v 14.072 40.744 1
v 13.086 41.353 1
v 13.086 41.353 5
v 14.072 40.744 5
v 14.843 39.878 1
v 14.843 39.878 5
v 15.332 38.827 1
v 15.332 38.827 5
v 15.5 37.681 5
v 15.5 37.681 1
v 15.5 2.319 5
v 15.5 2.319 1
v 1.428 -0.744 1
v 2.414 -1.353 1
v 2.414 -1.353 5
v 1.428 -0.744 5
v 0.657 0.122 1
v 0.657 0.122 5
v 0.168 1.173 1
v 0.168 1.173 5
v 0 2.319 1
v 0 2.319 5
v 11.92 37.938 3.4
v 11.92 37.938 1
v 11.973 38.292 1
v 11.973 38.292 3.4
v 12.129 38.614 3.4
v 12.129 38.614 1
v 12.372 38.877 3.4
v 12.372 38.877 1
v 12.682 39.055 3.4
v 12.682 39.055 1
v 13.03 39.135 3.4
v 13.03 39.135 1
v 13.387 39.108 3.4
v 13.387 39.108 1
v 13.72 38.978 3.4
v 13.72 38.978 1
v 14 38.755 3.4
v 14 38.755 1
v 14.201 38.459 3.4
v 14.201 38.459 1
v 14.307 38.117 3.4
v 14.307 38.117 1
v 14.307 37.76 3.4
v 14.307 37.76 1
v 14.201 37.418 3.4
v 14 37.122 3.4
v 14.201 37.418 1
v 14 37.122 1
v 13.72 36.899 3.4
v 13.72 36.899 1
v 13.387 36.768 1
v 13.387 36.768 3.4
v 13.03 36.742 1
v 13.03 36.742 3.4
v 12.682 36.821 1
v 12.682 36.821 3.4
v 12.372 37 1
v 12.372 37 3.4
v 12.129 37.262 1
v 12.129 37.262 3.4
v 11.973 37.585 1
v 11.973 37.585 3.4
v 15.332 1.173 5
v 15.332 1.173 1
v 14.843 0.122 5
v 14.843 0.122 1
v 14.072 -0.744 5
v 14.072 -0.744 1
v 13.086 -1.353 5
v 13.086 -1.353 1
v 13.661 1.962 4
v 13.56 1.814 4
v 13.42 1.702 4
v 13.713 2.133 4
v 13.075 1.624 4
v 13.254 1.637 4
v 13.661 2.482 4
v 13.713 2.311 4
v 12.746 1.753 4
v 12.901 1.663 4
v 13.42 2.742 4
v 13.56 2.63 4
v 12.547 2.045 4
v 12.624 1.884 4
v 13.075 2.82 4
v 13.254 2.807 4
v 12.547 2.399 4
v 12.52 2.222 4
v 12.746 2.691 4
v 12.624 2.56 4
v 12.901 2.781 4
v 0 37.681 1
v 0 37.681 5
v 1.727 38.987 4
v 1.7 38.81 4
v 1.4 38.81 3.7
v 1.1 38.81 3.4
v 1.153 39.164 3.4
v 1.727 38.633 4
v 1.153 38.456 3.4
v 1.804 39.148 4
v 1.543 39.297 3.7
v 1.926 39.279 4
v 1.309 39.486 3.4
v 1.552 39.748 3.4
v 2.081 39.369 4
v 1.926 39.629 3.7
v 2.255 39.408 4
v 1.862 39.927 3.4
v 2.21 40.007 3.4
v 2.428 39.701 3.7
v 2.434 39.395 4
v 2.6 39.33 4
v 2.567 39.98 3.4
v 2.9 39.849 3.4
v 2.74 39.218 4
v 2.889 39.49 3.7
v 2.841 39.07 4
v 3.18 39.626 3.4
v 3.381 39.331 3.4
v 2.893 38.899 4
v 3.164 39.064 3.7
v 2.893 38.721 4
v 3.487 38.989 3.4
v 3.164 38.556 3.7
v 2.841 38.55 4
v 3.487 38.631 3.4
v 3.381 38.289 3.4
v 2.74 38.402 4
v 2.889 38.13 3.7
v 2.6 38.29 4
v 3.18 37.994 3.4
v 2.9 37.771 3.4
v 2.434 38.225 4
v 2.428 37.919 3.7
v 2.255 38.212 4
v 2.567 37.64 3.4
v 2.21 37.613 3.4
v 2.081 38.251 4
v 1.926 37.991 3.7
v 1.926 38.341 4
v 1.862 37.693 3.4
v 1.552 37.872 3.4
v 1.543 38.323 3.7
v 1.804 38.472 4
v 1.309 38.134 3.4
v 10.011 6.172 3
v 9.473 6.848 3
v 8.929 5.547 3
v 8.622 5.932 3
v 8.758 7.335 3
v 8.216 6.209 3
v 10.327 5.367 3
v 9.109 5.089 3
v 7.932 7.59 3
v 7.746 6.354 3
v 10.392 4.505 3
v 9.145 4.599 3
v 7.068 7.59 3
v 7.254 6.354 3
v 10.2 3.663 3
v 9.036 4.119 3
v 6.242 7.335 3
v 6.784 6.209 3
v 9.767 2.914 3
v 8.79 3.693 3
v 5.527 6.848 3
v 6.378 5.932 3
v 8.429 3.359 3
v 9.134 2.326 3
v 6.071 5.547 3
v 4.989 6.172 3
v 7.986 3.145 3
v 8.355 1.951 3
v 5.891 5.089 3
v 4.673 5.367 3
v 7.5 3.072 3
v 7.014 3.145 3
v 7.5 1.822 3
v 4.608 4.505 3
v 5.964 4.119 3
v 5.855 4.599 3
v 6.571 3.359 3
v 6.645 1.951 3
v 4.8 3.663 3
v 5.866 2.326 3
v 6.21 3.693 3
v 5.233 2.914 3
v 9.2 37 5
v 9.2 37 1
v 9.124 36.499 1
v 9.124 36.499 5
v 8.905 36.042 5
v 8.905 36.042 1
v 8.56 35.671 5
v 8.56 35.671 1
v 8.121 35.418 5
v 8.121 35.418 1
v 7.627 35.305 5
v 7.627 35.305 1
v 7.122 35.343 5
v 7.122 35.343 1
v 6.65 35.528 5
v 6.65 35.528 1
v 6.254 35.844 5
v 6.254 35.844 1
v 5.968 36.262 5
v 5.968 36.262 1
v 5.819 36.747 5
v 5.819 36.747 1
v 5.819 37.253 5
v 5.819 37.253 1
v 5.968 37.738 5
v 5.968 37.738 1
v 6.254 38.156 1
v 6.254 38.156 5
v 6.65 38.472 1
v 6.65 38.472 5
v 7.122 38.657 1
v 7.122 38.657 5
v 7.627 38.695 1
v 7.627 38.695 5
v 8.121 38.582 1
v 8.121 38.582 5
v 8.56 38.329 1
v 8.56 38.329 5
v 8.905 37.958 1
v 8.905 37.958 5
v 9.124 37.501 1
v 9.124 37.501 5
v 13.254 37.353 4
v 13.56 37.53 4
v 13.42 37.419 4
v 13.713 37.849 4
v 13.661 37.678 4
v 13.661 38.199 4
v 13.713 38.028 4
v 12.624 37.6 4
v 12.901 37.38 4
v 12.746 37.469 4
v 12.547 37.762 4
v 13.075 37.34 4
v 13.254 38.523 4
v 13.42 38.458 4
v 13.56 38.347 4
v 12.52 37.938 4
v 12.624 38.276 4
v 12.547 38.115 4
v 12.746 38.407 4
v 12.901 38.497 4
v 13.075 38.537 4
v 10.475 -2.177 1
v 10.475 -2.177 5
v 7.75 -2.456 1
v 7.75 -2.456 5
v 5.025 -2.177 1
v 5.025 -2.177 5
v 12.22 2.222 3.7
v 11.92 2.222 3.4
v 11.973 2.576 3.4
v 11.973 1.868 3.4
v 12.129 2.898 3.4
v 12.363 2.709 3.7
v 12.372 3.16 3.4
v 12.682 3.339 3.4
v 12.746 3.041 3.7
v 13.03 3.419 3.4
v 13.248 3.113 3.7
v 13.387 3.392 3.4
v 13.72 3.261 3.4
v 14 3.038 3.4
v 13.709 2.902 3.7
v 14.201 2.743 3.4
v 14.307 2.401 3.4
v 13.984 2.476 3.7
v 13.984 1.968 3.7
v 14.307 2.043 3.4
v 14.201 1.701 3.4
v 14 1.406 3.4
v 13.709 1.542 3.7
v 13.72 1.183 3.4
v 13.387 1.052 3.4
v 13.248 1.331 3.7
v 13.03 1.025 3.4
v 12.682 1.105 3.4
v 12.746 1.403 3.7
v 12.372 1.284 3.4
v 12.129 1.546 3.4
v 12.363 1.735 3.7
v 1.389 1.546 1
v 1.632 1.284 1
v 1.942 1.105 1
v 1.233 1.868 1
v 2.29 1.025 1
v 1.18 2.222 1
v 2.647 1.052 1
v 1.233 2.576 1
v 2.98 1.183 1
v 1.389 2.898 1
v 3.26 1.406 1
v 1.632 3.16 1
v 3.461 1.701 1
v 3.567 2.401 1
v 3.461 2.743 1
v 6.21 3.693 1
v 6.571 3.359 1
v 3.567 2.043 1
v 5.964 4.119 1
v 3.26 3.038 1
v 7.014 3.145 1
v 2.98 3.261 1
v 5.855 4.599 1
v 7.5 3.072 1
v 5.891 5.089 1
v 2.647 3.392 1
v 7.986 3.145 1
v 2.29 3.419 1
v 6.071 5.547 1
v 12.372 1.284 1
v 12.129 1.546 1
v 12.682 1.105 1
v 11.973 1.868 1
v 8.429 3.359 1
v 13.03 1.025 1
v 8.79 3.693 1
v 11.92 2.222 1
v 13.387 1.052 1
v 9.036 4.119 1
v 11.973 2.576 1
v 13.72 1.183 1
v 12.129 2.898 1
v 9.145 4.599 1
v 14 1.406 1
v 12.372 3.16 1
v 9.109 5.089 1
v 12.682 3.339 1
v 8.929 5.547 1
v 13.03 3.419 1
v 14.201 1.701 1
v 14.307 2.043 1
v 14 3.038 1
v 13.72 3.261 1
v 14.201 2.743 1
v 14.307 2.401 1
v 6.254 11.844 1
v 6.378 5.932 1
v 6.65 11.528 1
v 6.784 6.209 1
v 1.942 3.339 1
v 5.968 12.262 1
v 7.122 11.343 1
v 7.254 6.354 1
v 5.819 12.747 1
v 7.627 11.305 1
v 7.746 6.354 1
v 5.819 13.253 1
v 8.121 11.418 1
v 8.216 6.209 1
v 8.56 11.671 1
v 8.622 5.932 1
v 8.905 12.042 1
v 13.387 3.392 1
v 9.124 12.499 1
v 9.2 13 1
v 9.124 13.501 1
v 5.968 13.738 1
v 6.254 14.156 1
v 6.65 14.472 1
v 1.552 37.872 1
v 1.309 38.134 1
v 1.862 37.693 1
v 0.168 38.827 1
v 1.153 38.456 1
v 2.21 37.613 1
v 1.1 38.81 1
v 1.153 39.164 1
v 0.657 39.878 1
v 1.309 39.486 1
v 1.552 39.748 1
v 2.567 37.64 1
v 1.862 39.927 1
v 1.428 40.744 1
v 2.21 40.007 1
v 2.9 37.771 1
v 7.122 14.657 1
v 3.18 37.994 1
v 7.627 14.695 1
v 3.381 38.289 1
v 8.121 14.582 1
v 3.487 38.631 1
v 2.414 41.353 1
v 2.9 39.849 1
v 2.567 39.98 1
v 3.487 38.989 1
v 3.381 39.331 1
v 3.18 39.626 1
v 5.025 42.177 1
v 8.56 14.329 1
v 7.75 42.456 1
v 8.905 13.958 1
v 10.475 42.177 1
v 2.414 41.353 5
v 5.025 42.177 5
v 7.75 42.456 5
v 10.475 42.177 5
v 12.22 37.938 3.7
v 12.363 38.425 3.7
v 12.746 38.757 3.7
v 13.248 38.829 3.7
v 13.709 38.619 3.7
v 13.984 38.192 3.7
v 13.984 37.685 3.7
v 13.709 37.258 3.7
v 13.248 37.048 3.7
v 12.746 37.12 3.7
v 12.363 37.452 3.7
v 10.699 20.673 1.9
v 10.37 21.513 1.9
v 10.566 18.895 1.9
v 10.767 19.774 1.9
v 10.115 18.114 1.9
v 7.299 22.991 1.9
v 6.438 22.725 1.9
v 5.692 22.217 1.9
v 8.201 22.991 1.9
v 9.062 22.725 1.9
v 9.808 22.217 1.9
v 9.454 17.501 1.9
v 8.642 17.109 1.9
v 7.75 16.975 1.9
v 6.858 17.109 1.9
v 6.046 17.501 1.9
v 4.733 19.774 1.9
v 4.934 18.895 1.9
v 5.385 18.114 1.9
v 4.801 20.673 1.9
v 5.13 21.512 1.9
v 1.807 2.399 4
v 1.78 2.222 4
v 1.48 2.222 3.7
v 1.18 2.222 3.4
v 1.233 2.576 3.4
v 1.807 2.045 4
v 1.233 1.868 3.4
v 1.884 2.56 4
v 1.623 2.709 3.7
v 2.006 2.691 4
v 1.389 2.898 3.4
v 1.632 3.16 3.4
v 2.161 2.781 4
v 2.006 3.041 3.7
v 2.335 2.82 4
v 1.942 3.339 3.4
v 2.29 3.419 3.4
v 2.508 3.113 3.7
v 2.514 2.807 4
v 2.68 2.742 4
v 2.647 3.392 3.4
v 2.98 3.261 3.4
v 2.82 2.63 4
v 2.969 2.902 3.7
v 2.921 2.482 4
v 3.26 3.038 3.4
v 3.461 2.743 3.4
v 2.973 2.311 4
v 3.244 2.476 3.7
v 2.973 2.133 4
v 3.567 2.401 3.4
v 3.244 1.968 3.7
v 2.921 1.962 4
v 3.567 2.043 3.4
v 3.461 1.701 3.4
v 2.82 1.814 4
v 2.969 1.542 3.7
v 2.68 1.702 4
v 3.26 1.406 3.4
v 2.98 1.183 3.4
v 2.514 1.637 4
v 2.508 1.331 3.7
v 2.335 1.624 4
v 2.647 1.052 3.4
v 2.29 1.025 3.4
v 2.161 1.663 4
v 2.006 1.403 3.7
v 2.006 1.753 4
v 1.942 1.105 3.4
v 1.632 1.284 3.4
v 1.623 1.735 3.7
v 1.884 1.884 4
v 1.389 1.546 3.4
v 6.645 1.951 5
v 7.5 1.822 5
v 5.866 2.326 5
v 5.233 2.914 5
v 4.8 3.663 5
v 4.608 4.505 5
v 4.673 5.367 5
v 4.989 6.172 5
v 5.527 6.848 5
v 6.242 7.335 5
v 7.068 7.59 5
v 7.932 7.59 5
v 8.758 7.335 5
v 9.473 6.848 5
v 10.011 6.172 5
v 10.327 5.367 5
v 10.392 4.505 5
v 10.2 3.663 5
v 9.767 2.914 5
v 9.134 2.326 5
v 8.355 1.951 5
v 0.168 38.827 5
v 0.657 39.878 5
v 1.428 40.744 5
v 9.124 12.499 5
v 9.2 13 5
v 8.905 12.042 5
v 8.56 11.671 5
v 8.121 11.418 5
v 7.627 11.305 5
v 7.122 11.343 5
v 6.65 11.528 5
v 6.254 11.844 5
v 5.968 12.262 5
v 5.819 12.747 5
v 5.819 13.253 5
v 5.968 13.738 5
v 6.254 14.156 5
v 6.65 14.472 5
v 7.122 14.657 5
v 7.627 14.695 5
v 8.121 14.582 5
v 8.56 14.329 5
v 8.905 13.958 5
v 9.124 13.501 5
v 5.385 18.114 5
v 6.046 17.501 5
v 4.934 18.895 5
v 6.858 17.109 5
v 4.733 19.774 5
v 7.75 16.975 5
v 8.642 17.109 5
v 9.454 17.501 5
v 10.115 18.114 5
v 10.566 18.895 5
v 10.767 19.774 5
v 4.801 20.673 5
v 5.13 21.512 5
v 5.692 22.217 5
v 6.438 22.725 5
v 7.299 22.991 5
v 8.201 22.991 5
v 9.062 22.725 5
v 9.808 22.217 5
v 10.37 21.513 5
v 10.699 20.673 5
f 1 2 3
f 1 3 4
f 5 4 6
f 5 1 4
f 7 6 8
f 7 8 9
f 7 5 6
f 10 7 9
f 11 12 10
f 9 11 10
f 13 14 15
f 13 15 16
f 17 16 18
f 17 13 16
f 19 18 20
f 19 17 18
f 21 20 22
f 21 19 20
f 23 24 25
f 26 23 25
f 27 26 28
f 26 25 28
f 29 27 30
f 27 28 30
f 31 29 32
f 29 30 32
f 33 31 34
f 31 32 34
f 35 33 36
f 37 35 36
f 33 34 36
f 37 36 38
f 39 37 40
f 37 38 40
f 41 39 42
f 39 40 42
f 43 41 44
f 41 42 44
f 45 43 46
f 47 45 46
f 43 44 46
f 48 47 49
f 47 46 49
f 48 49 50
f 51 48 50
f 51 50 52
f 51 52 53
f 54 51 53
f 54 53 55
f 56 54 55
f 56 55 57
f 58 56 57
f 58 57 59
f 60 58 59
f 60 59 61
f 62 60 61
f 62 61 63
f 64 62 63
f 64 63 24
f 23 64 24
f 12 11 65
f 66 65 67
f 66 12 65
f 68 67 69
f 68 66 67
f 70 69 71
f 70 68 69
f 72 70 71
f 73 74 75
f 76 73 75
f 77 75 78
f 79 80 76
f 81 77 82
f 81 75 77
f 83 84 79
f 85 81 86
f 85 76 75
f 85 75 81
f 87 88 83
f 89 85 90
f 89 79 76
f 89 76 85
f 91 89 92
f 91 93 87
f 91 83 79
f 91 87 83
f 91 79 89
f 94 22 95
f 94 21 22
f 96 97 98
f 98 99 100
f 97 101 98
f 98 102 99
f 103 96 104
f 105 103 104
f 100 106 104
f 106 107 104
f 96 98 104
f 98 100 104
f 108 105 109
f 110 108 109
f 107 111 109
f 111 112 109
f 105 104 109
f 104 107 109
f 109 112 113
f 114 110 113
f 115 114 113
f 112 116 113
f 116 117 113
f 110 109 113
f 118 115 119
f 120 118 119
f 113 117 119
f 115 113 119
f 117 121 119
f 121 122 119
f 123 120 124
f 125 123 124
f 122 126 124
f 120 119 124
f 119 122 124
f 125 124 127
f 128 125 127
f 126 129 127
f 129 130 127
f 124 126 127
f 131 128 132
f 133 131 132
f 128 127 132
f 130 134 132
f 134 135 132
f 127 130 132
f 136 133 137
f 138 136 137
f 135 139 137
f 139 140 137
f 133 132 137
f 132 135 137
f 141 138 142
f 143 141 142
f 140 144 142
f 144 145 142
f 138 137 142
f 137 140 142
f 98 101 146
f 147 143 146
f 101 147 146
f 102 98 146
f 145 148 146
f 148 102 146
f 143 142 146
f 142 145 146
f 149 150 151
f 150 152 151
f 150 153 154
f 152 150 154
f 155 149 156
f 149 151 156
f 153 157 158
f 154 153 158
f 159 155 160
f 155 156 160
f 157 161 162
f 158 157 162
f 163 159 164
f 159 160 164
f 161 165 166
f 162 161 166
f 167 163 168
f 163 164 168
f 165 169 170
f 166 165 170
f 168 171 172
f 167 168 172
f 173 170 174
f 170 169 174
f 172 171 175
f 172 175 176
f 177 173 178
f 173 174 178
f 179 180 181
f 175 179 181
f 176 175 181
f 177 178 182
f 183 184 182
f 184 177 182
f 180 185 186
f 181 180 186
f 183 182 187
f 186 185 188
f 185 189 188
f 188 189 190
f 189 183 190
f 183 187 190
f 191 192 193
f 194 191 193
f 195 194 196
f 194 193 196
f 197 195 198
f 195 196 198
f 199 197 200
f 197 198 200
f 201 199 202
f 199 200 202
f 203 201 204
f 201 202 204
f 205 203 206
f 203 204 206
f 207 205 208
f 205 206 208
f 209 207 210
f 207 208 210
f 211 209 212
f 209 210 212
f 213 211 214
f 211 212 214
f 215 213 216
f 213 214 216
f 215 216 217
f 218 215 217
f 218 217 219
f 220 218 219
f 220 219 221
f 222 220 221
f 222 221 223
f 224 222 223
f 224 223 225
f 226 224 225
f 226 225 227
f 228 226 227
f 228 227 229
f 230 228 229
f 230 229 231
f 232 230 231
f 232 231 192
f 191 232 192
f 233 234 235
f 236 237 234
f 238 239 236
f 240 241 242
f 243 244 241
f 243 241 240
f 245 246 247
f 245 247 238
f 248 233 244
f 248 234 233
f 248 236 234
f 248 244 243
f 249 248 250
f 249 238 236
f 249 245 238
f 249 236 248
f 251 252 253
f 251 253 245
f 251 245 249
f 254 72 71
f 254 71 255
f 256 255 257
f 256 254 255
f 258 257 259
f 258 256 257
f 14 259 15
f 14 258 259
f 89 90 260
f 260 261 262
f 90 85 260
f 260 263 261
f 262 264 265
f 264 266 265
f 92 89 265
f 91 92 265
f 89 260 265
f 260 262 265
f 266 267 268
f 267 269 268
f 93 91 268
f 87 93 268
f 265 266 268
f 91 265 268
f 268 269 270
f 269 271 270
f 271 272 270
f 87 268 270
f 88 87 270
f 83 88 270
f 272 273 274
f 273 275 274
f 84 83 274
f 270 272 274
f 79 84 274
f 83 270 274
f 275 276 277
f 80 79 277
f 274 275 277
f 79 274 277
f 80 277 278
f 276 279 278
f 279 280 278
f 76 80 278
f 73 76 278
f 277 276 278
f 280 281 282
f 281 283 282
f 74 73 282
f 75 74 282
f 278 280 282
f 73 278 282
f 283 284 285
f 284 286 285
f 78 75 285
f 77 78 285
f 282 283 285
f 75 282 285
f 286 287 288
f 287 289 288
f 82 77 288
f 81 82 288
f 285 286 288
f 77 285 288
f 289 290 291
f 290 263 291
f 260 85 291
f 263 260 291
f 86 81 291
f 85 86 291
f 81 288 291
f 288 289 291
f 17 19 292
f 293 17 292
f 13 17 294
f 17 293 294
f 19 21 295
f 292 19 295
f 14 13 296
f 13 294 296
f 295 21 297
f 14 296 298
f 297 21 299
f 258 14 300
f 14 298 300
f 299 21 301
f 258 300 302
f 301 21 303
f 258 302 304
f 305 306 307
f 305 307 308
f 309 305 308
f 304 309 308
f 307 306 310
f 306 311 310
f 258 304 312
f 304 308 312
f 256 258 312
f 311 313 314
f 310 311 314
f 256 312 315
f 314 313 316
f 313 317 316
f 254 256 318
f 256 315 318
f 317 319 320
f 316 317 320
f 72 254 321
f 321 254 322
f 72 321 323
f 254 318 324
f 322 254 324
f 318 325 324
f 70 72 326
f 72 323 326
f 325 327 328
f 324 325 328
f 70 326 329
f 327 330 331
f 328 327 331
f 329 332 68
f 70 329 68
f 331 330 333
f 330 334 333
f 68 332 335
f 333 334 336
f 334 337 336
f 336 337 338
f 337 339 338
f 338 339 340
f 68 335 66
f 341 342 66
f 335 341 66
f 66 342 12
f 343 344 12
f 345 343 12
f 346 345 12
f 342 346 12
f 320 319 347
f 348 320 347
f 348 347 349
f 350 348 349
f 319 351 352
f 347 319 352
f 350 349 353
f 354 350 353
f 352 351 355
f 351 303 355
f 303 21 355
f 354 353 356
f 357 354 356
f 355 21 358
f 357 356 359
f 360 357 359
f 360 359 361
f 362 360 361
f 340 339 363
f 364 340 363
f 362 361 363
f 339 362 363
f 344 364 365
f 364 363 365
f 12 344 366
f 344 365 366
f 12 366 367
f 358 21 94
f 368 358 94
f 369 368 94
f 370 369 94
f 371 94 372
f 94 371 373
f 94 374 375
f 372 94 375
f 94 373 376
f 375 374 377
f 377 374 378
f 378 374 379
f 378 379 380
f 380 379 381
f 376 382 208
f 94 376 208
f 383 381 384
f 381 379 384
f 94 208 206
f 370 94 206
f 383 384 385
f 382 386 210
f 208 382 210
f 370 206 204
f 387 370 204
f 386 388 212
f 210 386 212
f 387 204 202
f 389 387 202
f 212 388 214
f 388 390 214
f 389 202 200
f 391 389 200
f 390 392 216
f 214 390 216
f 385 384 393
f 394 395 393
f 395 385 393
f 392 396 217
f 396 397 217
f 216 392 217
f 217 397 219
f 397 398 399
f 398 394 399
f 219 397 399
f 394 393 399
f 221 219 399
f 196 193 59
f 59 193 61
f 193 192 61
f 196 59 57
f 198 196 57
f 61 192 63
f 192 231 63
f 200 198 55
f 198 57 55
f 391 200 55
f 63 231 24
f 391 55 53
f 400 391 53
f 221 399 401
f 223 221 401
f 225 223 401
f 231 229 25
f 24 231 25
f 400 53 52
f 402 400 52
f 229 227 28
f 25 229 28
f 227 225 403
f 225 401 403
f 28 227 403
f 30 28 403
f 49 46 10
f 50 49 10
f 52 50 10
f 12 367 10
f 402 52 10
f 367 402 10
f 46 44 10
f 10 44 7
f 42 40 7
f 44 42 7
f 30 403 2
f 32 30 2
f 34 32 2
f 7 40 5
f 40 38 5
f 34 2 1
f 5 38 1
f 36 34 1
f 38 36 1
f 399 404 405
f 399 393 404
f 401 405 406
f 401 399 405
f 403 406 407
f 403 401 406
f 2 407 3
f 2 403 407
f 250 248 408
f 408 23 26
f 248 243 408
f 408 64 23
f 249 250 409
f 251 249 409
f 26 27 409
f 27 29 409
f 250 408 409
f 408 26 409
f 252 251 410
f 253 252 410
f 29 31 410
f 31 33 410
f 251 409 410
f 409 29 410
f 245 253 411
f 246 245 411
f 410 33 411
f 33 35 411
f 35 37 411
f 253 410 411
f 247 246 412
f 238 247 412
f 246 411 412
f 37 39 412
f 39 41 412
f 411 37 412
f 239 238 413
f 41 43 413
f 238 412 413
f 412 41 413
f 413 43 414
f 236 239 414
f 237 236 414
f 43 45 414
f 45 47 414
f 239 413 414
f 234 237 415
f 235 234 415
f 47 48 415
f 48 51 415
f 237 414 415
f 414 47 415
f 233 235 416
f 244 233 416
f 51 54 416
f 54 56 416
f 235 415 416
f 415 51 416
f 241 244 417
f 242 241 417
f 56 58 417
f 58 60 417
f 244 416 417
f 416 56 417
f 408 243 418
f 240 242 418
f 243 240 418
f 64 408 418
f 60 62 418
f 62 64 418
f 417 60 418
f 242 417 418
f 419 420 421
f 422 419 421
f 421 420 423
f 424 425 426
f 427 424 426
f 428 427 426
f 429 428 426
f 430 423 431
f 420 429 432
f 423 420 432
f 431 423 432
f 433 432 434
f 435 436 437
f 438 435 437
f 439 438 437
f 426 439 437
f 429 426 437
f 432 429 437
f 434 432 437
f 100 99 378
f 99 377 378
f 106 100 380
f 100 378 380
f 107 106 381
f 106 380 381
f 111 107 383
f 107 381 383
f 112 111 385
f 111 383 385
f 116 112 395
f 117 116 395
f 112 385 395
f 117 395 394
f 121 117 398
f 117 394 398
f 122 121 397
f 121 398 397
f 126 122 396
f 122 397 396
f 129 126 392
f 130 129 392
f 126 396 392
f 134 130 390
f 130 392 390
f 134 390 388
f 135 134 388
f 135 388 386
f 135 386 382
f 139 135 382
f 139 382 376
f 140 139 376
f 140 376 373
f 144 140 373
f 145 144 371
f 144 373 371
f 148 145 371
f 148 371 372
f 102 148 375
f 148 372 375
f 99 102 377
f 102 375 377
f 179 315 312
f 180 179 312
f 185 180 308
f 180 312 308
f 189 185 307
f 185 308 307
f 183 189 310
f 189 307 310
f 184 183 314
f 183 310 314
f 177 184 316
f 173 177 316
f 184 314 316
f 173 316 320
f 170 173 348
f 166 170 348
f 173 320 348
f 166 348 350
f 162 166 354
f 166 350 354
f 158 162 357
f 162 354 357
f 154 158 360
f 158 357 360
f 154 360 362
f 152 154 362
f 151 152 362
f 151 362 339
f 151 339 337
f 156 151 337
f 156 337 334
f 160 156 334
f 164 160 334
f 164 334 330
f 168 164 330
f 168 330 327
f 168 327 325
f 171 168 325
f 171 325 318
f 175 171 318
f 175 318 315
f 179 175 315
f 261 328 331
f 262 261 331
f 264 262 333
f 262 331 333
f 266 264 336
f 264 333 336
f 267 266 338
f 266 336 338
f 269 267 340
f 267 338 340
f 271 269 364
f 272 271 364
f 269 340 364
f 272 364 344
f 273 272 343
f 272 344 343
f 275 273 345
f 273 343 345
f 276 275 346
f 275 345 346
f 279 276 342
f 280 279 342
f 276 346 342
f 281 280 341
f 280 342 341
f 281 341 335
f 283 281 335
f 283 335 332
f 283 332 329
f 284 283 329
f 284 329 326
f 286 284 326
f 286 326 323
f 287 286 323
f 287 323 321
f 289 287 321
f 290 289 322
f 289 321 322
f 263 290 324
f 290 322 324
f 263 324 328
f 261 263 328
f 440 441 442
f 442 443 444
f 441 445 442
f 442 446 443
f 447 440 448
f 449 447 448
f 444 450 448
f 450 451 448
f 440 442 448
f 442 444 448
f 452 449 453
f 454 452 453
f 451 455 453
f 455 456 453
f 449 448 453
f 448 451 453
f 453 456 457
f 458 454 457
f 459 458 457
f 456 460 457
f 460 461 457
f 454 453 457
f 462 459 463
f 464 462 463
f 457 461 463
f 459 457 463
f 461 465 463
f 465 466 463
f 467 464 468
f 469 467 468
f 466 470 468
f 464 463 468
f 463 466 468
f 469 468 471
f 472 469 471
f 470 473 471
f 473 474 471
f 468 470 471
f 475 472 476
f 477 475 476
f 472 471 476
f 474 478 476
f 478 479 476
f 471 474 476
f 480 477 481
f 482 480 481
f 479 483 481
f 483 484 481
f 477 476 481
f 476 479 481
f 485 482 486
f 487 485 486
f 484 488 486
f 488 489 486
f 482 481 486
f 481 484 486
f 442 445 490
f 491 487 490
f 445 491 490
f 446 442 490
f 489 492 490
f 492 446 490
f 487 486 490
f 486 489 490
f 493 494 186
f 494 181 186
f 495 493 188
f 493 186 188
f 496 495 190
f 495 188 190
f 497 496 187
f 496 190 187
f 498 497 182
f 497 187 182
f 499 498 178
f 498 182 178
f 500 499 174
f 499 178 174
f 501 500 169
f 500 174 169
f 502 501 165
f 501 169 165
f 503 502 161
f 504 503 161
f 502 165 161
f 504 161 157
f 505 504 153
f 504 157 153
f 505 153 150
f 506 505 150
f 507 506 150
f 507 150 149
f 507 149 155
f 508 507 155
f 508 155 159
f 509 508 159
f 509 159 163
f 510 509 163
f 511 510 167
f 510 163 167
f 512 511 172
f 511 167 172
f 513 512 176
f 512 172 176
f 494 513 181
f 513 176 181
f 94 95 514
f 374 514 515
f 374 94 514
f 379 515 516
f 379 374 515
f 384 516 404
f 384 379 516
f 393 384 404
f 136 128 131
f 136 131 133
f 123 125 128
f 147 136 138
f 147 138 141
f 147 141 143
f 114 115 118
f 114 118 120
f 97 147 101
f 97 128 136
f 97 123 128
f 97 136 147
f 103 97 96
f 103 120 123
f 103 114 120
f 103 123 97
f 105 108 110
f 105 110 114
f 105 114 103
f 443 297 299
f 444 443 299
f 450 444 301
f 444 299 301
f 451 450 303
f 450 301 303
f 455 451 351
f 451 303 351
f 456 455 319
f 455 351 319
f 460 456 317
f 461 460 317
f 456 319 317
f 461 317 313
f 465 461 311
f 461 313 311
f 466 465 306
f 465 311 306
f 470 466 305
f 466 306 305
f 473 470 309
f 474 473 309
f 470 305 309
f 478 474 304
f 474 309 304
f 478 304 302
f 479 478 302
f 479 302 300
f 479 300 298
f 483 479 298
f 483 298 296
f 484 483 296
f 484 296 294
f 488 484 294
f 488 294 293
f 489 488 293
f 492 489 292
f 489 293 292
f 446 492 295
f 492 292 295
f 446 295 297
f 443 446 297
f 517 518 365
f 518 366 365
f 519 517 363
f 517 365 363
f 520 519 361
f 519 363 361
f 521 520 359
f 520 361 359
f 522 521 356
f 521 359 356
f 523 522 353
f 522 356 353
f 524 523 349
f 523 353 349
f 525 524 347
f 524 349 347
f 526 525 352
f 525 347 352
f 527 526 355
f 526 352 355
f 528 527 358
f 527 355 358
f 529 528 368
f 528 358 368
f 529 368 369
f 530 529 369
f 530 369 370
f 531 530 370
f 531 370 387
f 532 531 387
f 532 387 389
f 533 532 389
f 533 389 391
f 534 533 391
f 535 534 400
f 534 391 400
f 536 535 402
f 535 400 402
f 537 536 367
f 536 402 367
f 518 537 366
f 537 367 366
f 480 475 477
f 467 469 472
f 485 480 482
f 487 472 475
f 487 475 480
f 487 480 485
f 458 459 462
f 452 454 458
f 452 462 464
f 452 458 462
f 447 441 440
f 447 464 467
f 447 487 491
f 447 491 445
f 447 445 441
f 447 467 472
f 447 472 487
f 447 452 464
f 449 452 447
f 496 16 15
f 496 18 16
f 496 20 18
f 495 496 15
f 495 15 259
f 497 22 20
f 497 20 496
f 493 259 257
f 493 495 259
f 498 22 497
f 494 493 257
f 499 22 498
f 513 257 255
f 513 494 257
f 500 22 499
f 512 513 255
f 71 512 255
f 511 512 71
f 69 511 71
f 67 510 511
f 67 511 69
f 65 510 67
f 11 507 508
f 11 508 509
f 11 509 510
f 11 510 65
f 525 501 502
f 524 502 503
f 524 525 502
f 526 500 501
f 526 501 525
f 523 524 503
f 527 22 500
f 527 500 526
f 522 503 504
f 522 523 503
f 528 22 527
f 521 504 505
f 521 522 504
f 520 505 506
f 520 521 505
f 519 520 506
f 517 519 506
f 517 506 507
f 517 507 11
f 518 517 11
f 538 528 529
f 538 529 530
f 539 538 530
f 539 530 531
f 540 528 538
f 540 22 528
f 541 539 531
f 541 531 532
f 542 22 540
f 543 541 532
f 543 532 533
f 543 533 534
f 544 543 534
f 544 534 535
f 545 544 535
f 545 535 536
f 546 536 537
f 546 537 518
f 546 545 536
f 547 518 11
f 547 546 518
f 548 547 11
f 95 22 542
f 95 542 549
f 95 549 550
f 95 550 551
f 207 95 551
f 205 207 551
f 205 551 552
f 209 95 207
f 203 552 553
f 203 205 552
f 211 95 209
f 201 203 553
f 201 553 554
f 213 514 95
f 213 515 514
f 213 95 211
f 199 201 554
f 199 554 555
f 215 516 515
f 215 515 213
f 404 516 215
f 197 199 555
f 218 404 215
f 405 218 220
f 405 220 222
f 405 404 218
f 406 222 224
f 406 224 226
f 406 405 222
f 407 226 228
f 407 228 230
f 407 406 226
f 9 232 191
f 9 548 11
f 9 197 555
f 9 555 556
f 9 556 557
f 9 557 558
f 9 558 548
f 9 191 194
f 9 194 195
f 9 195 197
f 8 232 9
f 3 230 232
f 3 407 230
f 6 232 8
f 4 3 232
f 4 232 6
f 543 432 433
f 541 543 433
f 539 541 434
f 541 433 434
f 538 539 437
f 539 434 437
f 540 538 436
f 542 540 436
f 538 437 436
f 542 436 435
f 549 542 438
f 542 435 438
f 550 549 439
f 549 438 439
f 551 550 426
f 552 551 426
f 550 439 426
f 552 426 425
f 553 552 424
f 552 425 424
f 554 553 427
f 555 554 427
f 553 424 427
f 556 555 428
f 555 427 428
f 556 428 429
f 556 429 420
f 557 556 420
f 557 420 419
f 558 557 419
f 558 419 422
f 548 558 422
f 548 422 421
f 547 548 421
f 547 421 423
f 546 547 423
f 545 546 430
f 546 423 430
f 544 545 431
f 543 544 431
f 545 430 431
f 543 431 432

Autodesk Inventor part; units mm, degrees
ref_plane "YZ Plane" through (0, 0, 0) normal (1, 0, 0) x (0, 1, 0)
ref_plane "XZ Plane" through (0, 0, 0) normal (0, 1, 0) x (-1, 0, 0)
ref_plane "XY Plane" through (0, 0, 0) normal (0, 0, 1) x (1, 0, 0)
sketch "Skizze1" plane through (0, 0, 0) normal (0, 0, 1) x (1, 0, 0)
  circle A0 centre (7.5, 13) radius 1.7 projected
  circle A1 centre (7.5, 37) radius 1.7 projected
  arc A2 (15.5, 37.6806) -> (13.0863, 41.3526) centre (11.5, 37.6806) ccw projected
  arc A3 (13.0863, 41.3526) -> (2.4137, 41.3526) centre (7.75, 29) ccw projected
  arc A4 (2.4137, 41.3526) -> (0, 37.6806) centre (4, 37.6806) ccw projected
  line L0 (0, 2.3194) -> (0, 37.6806) projected
  arc A5 (0, 2.3194) -> (2.4137, -1.3526) centre (4, 2.3194) ccw projected
  arc A6 (2.4137, -1.3526) -> (13.0863, -1.3526) centre (7.75, 11) ccw projected
  arc A7 (13.0863, -1.3526) -> (15.5, 2.3194) centre (11.5, 2.3194) ccw projected
  line L1 (15.5, 2.3194) -> (15.5, 37.6806) projected
  point P0 (0, 0)
extrude "Extrusion1" add sketch "Skizze1" along normal blind 5
sketch "Skizze2" plane through (0, 0, 5) normal (0, 0, 1) x (1, 0, 0)
  arc A0 (2.4137, -1.3526) -> (13.0863, -1.3526) centre (7.75, 11) ccw projected
  arc A1 (13.0863, -1.3526) -> (15.5, 2.3194) centre (11.5, 2.3194) ccw projected
  line L0 (15.5, 2.3194) -> (15.5, 37.6806) projected
  arc A2 (15.5, 37.6806) -> (13.0863, 41.3526) centre (11.5, 37.6806) ccw projected
  arc A3 (13.0863, 41.3526) -> (2.4137, 41.3526) centre (7.75, 29) ccw projected
  arc A4 (2.4137, 41.3526) -> (0, 37.6806) centre (4, 37.6806) ccw projected
  line L1 (0, 37.6806) -> (0, 2.3194) projected
  arc A5 (0, 2.3194) -> (2.4137, -1.3526) centre (4, 2.3194) ccw projected
  circle A6 centre (7.5, 37) radius 1.7 projected
  circle A7 centre (7.5, 13) radius 1.7 projected
  line L2 (7.75, 20) -> (7.75, 20)
  line L3 (7.75, 20) -> (7.75, -2.4559)
  line L4 (7.75, -2.4559) -> (7.75, -2.4559)
  line L5 (7.75, -2.4559) -> (7.75, 20)
  point P0 (0, 0)
  point P1 (7.75, -2.4559)
  dimension "d2" = 44.9119
  dimension "d3" = 15.5
  dimension "d4" = 22.456
  dimension "d5" = 0
hole "Bohrung1" at (7.75, 20, 5) direction (0, 0, -1) diameter 6.05 depth 3.1
sketch "Skizze4" plane through (0, 0, 5) normal (0, 0, 1) x (1, 0, 0)
  circle A0 centre (7.5, 4.722) radius 1.9913 projected
  point P0 (0, 0)
hole "Bohrung2" at (7.5, 4.722, 5) direction (0, 0, -1) diameter 3.3 end through all counterbore diameter 5.8 counterbore depth 2 clearance for "Inbusschraube DIN EN ISO 4762" size "M3" standard "DIN"
move faces "Verschieben1" translate (0, 0, 1) faces at (13.3835, 17.8023, 0)
sketch "Skizze6" plane through (7.75, 11, 1) normal (0, 0, -1) x (-1, 0, 0)
  circle A0 centre (-5.37, 26.9384) radius 1
  circle A1 centre (5.81, 25.1971) radius 1
  circle A2 centre (5.81, 25.1971) radius 1.2
  circle A3 centre (-5.37, 26.9384) radius 1.2
  circle A4 centre (5.87, 26.9384) radius 1
  circle A5 centre (-5.37, 26.9384) radius 1
  circle A6 centre (5.87, 26.9384) radius 1.2
  arc A7 (4.9199, 26.9621) -> (4.4911, 27.5261) centre (5.45, 27.81) ccw
  circle A8 centre (-5.37, 26.9384) radius 1
  circle A9 centre (5.37, -8.778) radius 1
  circle A10 centre (-5.37, -8.778) radius 1
  circle A11 centre (5.45, 27.81) radius 1.2
  circle A12 centre (-5.37, -8.778) radius 1.2
  circle A13 centre (5.37, -8.778) radius 1.2
  point P0 (7.75, -11)
  dimension "d37" = 2.4
  dimension "d38" = 2.4
  dimension "d44" = 2.4
  dimension "d45" = 2.4
  dimension "d46" = 2.4
  dimension "d47" = 2.4
extrude "Extrusion4" cut sketch "Skizze6" against normal blind 3 contours A0 | A11 A6 | A6 A7 A4 A11 | A11 A4 A7 A6 | A4 A11 | A3 | A9 | A10 | A12 | A13
chamfer "Fase1" distance 0.6 angle 45 4 edges at (14.32, 37.9384, 4) (3.5, 38.81, 4) (3.58, 2.222, 4) (14.32, 2.222, 4)
equation "\"d4\" = 0.5 * d2"
equation "\"d37\" = d38"
equation "\"d44\" = d38"
equation "\"d45\" = d38"
equation "\"d46\" = d38"
equation "\"d47\" = d38"
properties part number "Front-Idlers_Housing-Cover"
